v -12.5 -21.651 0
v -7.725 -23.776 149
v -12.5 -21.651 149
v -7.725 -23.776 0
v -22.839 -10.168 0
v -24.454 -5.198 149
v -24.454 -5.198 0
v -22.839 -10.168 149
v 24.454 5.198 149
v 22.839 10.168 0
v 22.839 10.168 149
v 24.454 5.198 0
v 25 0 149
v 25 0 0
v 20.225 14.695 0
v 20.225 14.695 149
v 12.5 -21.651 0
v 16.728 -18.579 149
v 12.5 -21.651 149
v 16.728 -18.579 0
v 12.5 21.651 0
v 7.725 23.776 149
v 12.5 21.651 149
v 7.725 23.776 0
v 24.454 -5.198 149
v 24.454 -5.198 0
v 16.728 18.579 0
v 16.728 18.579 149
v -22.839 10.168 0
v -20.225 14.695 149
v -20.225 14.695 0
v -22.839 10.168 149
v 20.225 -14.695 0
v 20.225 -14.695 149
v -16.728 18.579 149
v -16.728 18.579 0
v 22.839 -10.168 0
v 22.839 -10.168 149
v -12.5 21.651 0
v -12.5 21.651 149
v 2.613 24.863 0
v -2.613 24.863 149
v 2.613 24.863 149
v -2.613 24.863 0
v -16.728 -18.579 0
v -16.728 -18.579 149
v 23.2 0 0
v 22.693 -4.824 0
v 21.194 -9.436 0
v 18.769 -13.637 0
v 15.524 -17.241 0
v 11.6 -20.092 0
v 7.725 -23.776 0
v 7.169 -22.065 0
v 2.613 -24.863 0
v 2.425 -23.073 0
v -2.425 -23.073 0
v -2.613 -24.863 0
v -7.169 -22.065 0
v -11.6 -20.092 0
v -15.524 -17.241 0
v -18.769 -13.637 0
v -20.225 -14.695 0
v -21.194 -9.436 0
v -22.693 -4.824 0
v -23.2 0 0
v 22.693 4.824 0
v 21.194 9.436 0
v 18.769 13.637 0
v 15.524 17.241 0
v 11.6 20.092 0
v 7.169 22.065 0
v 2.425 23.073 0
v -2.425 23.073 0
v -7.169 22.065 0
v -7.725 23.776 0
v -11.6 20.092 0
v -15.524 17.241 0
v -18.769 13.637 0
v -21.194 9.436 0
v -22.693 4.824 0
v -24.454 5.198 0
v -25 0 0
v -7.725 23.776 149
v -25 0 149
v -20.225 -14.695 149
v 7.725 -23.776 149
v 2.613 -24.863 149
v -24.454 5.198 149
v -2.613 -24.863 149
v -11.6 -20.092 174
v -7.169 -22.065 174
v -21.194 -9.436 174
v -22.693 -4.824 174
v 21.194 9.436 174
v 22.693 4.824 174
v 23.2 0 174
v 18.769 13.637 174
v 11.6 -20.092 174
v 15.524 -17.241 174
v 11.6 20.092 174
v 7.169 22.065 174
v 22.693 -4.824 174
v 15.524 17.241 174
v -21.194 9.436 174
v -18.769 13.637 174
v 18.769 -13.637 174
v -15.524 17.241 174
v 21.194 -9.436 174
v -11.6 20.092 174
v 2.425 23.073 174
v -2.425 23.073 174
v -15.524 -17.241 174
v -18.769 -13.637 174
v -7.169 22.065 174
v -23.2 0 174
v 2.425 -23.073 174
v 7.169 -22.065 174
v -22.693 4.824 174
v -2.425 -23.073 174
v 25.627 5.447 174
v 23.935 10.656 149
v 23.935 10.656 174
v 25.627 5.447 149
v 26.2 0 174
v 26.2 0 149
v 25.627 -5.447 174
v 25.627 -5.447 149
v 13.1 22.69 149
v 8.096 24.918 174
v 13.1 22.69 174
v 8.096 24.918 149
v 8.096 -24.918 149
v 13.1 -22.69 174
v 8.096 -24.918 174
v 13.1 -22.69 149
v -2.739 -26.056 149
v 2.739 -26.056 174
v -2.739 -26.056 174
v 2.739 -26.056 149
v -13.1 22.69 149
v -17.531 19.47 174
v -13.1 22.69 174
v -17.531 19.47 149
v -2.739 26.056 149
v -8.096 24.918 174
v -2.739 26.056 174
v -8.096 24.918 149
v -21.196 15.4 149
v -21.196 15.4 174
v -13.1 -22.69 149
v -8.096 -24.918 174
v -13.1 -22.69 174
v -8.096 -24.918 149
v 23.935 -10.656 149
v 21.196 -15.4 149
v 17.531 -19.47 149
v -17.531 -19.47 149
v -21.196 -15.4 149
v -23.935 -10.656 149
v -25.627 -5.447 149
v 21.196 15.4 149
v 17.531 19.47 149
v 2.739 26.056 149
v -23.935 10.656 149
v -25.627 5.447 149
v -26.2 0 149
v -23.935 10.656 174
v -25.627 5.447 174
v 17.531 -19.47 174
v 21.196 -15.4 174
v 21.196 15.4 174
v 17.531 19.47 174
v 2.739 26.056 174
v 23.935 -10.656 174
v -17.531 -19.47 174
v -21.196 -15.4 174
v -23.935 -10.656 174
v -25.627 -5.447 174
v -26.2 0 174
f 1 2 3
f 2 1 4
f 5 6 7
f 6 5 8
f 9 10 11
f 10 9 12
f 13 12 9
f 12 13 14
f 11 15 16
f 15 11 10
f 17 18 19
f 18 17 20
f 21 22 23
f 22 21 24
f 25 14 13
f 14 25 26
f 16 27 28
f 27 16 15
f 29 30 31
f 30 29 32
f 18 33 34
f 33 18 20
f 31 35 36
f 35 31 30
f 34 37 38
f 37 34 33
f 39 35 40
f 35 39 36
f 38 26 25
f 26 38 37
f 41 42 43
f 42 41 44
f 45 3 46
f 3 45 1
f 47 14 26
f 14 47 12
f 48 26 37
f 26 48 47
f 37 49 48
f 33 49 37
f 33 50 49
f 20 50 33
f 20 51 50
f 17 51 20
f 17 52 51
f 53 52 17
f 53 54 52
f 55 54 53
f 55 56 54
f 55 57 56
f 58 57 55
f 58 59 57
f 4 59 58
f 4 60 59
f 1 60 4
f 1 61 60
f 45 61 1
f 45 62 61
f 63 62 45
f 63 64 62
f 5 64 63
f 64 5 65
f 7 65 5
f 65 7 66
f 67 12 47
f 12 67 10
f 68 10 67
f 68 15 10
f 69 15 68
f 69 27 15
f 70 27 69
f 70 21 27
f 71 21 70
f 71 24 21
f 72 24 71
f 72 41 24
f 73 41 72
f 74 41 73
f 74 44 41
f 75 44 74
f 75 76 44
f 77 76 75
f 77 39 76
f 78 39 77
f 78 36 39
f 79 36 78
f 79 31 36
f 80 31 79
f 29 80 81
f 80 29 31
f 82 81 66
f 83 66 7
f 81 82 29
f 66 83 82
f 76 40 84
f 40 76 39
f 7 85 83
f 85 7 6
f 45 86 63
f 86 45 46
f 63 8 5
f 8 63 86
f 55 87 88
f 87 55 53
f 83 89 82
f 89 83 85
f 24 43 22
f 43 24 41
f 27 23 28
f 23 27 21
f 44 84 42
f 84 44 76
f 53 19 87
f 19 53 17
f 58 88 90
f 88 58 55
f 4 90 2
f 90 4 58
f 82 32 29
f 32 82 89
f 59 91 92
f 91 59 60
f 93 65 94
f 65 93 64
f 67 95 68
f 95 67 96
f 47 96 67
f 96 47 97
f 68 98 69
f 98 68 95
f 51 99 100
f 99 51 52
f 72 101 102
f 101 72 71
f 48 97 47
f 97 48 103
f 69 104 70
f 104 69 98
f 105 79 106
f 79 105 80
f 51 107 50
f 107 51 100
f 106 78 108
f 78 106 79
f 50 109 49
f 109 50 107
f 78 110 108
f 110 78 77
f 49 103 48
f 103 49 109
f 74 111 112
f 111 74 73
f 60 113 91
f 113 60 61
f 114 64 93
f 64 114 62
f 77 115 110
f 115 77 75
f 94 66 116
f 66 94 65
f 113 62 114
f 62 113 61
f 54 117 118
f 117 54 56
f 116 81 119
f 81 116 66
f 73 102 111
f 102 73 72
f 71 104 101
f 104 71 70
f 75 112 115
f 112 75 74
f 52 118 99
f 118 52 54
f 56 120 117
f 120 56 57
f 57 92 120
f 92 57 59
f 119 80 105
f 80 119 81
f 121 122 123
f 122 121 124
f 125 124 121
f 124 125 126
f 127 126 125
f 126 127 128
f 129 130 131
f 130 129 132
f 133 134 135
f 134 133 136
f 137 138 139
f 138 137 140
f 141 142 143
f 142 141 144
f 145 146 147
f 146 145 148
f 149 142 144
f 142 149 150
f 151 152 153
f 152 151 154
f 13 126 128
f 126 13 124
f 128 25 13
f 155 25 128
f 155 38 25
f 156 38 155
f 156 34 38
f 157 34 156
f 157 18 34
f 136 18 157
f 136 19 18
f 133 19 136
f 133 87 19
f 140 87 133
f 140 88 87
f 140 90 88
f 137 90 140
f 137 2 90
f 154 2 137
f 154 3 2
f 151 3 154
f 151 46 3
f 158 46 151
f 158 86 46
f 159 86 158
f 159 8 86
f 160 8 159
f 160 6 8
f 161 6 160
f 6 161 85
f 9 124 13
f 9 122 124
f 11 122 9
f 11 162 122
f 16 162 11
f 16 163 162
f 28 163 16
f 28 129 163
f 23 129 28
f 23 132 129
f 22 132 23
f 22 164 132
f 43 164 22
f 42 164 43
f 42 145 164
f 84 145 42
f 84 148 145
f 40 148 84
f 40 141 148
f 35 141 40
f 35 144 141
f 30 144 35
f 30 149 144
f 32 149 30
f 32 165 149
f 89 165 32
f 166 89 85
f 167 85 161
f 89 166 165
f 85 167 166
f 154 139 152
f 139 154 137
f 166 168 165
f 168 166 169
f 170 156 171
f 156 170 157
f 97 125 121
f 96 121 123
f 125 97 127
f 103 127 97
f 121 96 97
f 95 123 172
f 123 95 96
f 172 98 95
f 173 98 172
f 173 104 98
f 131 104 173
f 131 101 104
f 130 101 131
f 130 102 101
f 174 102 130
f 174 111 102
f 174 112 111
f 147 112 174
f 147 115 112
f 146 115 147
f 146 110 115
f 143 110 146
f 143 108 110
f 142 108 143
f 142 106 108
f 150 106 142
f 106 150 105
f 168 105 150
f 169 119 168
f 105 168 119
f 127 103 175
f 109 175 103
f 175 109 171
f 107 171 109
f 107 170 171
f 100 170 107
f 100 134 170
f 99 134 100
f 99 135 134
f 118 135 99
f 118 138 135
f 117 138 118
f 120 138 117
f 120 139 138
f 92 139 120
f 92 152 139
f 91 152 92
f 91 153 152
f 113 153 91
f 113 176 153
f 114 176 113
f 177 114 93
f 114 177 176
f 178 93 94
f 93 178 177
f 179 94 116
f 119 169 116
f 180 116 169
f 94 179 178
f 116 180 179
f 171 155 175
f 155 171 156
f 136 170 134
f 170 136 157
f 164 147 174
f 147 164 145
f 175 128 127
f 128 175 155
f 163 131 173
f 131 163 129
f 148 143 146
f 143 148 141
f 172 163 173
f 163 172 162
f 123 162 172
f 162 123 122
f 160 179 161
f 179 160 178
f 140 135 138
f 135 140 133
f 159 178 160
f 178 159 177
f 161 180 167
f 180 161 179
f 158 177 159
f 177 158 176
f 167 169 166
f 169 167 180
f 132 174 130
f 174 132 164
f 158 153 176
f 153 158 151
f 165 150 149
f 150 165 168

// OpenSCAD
// Parameters
pipe_standard = 1; //[1:1:1]
nominal_diameter = 50; //[25:100:1]
length_mm = 150; //[75:300:1]
pipe_od = 50; //[25:100:1]
wall_thickness = 1.8; //[0.9:3.6:0.1]
socket_length = 25; //[12.5:50:0.5]
socket_wall_extra = 1.2; //[0.6:2.4:0.1]
overlap = 1; //[0.5:2:0.1]

// Module for the HT pipe segment
module ht_pipe() {
  color([0.85, 0.85, 0.8]) { // PVC color
    // Hollow tube body
    difference() {
      cylinder(h=length_mm, r=pipe_od/2, center=false);
      translate([0, 0, 0])
        cylinder(h=length_mm, r=pipe_od/2 - wall_thickness, center=false);
    }
    
    // End fitting geometry
    difference() {
      translate([0, 0, length_mm - overlap])
        cylinder(h=socket_length, r=pipe_od/2 + socket_wall_extra, center=false);
      translate([0, 0, length_mm - overlap])
        cylinder(h=socket_length + overlap, r=pipe_od/2 - wall_thickness, center=false);
    }
  }
}

// Assembly module
module assembly() {
  ht_pipe();
}

// Call the assembly
assembly();
